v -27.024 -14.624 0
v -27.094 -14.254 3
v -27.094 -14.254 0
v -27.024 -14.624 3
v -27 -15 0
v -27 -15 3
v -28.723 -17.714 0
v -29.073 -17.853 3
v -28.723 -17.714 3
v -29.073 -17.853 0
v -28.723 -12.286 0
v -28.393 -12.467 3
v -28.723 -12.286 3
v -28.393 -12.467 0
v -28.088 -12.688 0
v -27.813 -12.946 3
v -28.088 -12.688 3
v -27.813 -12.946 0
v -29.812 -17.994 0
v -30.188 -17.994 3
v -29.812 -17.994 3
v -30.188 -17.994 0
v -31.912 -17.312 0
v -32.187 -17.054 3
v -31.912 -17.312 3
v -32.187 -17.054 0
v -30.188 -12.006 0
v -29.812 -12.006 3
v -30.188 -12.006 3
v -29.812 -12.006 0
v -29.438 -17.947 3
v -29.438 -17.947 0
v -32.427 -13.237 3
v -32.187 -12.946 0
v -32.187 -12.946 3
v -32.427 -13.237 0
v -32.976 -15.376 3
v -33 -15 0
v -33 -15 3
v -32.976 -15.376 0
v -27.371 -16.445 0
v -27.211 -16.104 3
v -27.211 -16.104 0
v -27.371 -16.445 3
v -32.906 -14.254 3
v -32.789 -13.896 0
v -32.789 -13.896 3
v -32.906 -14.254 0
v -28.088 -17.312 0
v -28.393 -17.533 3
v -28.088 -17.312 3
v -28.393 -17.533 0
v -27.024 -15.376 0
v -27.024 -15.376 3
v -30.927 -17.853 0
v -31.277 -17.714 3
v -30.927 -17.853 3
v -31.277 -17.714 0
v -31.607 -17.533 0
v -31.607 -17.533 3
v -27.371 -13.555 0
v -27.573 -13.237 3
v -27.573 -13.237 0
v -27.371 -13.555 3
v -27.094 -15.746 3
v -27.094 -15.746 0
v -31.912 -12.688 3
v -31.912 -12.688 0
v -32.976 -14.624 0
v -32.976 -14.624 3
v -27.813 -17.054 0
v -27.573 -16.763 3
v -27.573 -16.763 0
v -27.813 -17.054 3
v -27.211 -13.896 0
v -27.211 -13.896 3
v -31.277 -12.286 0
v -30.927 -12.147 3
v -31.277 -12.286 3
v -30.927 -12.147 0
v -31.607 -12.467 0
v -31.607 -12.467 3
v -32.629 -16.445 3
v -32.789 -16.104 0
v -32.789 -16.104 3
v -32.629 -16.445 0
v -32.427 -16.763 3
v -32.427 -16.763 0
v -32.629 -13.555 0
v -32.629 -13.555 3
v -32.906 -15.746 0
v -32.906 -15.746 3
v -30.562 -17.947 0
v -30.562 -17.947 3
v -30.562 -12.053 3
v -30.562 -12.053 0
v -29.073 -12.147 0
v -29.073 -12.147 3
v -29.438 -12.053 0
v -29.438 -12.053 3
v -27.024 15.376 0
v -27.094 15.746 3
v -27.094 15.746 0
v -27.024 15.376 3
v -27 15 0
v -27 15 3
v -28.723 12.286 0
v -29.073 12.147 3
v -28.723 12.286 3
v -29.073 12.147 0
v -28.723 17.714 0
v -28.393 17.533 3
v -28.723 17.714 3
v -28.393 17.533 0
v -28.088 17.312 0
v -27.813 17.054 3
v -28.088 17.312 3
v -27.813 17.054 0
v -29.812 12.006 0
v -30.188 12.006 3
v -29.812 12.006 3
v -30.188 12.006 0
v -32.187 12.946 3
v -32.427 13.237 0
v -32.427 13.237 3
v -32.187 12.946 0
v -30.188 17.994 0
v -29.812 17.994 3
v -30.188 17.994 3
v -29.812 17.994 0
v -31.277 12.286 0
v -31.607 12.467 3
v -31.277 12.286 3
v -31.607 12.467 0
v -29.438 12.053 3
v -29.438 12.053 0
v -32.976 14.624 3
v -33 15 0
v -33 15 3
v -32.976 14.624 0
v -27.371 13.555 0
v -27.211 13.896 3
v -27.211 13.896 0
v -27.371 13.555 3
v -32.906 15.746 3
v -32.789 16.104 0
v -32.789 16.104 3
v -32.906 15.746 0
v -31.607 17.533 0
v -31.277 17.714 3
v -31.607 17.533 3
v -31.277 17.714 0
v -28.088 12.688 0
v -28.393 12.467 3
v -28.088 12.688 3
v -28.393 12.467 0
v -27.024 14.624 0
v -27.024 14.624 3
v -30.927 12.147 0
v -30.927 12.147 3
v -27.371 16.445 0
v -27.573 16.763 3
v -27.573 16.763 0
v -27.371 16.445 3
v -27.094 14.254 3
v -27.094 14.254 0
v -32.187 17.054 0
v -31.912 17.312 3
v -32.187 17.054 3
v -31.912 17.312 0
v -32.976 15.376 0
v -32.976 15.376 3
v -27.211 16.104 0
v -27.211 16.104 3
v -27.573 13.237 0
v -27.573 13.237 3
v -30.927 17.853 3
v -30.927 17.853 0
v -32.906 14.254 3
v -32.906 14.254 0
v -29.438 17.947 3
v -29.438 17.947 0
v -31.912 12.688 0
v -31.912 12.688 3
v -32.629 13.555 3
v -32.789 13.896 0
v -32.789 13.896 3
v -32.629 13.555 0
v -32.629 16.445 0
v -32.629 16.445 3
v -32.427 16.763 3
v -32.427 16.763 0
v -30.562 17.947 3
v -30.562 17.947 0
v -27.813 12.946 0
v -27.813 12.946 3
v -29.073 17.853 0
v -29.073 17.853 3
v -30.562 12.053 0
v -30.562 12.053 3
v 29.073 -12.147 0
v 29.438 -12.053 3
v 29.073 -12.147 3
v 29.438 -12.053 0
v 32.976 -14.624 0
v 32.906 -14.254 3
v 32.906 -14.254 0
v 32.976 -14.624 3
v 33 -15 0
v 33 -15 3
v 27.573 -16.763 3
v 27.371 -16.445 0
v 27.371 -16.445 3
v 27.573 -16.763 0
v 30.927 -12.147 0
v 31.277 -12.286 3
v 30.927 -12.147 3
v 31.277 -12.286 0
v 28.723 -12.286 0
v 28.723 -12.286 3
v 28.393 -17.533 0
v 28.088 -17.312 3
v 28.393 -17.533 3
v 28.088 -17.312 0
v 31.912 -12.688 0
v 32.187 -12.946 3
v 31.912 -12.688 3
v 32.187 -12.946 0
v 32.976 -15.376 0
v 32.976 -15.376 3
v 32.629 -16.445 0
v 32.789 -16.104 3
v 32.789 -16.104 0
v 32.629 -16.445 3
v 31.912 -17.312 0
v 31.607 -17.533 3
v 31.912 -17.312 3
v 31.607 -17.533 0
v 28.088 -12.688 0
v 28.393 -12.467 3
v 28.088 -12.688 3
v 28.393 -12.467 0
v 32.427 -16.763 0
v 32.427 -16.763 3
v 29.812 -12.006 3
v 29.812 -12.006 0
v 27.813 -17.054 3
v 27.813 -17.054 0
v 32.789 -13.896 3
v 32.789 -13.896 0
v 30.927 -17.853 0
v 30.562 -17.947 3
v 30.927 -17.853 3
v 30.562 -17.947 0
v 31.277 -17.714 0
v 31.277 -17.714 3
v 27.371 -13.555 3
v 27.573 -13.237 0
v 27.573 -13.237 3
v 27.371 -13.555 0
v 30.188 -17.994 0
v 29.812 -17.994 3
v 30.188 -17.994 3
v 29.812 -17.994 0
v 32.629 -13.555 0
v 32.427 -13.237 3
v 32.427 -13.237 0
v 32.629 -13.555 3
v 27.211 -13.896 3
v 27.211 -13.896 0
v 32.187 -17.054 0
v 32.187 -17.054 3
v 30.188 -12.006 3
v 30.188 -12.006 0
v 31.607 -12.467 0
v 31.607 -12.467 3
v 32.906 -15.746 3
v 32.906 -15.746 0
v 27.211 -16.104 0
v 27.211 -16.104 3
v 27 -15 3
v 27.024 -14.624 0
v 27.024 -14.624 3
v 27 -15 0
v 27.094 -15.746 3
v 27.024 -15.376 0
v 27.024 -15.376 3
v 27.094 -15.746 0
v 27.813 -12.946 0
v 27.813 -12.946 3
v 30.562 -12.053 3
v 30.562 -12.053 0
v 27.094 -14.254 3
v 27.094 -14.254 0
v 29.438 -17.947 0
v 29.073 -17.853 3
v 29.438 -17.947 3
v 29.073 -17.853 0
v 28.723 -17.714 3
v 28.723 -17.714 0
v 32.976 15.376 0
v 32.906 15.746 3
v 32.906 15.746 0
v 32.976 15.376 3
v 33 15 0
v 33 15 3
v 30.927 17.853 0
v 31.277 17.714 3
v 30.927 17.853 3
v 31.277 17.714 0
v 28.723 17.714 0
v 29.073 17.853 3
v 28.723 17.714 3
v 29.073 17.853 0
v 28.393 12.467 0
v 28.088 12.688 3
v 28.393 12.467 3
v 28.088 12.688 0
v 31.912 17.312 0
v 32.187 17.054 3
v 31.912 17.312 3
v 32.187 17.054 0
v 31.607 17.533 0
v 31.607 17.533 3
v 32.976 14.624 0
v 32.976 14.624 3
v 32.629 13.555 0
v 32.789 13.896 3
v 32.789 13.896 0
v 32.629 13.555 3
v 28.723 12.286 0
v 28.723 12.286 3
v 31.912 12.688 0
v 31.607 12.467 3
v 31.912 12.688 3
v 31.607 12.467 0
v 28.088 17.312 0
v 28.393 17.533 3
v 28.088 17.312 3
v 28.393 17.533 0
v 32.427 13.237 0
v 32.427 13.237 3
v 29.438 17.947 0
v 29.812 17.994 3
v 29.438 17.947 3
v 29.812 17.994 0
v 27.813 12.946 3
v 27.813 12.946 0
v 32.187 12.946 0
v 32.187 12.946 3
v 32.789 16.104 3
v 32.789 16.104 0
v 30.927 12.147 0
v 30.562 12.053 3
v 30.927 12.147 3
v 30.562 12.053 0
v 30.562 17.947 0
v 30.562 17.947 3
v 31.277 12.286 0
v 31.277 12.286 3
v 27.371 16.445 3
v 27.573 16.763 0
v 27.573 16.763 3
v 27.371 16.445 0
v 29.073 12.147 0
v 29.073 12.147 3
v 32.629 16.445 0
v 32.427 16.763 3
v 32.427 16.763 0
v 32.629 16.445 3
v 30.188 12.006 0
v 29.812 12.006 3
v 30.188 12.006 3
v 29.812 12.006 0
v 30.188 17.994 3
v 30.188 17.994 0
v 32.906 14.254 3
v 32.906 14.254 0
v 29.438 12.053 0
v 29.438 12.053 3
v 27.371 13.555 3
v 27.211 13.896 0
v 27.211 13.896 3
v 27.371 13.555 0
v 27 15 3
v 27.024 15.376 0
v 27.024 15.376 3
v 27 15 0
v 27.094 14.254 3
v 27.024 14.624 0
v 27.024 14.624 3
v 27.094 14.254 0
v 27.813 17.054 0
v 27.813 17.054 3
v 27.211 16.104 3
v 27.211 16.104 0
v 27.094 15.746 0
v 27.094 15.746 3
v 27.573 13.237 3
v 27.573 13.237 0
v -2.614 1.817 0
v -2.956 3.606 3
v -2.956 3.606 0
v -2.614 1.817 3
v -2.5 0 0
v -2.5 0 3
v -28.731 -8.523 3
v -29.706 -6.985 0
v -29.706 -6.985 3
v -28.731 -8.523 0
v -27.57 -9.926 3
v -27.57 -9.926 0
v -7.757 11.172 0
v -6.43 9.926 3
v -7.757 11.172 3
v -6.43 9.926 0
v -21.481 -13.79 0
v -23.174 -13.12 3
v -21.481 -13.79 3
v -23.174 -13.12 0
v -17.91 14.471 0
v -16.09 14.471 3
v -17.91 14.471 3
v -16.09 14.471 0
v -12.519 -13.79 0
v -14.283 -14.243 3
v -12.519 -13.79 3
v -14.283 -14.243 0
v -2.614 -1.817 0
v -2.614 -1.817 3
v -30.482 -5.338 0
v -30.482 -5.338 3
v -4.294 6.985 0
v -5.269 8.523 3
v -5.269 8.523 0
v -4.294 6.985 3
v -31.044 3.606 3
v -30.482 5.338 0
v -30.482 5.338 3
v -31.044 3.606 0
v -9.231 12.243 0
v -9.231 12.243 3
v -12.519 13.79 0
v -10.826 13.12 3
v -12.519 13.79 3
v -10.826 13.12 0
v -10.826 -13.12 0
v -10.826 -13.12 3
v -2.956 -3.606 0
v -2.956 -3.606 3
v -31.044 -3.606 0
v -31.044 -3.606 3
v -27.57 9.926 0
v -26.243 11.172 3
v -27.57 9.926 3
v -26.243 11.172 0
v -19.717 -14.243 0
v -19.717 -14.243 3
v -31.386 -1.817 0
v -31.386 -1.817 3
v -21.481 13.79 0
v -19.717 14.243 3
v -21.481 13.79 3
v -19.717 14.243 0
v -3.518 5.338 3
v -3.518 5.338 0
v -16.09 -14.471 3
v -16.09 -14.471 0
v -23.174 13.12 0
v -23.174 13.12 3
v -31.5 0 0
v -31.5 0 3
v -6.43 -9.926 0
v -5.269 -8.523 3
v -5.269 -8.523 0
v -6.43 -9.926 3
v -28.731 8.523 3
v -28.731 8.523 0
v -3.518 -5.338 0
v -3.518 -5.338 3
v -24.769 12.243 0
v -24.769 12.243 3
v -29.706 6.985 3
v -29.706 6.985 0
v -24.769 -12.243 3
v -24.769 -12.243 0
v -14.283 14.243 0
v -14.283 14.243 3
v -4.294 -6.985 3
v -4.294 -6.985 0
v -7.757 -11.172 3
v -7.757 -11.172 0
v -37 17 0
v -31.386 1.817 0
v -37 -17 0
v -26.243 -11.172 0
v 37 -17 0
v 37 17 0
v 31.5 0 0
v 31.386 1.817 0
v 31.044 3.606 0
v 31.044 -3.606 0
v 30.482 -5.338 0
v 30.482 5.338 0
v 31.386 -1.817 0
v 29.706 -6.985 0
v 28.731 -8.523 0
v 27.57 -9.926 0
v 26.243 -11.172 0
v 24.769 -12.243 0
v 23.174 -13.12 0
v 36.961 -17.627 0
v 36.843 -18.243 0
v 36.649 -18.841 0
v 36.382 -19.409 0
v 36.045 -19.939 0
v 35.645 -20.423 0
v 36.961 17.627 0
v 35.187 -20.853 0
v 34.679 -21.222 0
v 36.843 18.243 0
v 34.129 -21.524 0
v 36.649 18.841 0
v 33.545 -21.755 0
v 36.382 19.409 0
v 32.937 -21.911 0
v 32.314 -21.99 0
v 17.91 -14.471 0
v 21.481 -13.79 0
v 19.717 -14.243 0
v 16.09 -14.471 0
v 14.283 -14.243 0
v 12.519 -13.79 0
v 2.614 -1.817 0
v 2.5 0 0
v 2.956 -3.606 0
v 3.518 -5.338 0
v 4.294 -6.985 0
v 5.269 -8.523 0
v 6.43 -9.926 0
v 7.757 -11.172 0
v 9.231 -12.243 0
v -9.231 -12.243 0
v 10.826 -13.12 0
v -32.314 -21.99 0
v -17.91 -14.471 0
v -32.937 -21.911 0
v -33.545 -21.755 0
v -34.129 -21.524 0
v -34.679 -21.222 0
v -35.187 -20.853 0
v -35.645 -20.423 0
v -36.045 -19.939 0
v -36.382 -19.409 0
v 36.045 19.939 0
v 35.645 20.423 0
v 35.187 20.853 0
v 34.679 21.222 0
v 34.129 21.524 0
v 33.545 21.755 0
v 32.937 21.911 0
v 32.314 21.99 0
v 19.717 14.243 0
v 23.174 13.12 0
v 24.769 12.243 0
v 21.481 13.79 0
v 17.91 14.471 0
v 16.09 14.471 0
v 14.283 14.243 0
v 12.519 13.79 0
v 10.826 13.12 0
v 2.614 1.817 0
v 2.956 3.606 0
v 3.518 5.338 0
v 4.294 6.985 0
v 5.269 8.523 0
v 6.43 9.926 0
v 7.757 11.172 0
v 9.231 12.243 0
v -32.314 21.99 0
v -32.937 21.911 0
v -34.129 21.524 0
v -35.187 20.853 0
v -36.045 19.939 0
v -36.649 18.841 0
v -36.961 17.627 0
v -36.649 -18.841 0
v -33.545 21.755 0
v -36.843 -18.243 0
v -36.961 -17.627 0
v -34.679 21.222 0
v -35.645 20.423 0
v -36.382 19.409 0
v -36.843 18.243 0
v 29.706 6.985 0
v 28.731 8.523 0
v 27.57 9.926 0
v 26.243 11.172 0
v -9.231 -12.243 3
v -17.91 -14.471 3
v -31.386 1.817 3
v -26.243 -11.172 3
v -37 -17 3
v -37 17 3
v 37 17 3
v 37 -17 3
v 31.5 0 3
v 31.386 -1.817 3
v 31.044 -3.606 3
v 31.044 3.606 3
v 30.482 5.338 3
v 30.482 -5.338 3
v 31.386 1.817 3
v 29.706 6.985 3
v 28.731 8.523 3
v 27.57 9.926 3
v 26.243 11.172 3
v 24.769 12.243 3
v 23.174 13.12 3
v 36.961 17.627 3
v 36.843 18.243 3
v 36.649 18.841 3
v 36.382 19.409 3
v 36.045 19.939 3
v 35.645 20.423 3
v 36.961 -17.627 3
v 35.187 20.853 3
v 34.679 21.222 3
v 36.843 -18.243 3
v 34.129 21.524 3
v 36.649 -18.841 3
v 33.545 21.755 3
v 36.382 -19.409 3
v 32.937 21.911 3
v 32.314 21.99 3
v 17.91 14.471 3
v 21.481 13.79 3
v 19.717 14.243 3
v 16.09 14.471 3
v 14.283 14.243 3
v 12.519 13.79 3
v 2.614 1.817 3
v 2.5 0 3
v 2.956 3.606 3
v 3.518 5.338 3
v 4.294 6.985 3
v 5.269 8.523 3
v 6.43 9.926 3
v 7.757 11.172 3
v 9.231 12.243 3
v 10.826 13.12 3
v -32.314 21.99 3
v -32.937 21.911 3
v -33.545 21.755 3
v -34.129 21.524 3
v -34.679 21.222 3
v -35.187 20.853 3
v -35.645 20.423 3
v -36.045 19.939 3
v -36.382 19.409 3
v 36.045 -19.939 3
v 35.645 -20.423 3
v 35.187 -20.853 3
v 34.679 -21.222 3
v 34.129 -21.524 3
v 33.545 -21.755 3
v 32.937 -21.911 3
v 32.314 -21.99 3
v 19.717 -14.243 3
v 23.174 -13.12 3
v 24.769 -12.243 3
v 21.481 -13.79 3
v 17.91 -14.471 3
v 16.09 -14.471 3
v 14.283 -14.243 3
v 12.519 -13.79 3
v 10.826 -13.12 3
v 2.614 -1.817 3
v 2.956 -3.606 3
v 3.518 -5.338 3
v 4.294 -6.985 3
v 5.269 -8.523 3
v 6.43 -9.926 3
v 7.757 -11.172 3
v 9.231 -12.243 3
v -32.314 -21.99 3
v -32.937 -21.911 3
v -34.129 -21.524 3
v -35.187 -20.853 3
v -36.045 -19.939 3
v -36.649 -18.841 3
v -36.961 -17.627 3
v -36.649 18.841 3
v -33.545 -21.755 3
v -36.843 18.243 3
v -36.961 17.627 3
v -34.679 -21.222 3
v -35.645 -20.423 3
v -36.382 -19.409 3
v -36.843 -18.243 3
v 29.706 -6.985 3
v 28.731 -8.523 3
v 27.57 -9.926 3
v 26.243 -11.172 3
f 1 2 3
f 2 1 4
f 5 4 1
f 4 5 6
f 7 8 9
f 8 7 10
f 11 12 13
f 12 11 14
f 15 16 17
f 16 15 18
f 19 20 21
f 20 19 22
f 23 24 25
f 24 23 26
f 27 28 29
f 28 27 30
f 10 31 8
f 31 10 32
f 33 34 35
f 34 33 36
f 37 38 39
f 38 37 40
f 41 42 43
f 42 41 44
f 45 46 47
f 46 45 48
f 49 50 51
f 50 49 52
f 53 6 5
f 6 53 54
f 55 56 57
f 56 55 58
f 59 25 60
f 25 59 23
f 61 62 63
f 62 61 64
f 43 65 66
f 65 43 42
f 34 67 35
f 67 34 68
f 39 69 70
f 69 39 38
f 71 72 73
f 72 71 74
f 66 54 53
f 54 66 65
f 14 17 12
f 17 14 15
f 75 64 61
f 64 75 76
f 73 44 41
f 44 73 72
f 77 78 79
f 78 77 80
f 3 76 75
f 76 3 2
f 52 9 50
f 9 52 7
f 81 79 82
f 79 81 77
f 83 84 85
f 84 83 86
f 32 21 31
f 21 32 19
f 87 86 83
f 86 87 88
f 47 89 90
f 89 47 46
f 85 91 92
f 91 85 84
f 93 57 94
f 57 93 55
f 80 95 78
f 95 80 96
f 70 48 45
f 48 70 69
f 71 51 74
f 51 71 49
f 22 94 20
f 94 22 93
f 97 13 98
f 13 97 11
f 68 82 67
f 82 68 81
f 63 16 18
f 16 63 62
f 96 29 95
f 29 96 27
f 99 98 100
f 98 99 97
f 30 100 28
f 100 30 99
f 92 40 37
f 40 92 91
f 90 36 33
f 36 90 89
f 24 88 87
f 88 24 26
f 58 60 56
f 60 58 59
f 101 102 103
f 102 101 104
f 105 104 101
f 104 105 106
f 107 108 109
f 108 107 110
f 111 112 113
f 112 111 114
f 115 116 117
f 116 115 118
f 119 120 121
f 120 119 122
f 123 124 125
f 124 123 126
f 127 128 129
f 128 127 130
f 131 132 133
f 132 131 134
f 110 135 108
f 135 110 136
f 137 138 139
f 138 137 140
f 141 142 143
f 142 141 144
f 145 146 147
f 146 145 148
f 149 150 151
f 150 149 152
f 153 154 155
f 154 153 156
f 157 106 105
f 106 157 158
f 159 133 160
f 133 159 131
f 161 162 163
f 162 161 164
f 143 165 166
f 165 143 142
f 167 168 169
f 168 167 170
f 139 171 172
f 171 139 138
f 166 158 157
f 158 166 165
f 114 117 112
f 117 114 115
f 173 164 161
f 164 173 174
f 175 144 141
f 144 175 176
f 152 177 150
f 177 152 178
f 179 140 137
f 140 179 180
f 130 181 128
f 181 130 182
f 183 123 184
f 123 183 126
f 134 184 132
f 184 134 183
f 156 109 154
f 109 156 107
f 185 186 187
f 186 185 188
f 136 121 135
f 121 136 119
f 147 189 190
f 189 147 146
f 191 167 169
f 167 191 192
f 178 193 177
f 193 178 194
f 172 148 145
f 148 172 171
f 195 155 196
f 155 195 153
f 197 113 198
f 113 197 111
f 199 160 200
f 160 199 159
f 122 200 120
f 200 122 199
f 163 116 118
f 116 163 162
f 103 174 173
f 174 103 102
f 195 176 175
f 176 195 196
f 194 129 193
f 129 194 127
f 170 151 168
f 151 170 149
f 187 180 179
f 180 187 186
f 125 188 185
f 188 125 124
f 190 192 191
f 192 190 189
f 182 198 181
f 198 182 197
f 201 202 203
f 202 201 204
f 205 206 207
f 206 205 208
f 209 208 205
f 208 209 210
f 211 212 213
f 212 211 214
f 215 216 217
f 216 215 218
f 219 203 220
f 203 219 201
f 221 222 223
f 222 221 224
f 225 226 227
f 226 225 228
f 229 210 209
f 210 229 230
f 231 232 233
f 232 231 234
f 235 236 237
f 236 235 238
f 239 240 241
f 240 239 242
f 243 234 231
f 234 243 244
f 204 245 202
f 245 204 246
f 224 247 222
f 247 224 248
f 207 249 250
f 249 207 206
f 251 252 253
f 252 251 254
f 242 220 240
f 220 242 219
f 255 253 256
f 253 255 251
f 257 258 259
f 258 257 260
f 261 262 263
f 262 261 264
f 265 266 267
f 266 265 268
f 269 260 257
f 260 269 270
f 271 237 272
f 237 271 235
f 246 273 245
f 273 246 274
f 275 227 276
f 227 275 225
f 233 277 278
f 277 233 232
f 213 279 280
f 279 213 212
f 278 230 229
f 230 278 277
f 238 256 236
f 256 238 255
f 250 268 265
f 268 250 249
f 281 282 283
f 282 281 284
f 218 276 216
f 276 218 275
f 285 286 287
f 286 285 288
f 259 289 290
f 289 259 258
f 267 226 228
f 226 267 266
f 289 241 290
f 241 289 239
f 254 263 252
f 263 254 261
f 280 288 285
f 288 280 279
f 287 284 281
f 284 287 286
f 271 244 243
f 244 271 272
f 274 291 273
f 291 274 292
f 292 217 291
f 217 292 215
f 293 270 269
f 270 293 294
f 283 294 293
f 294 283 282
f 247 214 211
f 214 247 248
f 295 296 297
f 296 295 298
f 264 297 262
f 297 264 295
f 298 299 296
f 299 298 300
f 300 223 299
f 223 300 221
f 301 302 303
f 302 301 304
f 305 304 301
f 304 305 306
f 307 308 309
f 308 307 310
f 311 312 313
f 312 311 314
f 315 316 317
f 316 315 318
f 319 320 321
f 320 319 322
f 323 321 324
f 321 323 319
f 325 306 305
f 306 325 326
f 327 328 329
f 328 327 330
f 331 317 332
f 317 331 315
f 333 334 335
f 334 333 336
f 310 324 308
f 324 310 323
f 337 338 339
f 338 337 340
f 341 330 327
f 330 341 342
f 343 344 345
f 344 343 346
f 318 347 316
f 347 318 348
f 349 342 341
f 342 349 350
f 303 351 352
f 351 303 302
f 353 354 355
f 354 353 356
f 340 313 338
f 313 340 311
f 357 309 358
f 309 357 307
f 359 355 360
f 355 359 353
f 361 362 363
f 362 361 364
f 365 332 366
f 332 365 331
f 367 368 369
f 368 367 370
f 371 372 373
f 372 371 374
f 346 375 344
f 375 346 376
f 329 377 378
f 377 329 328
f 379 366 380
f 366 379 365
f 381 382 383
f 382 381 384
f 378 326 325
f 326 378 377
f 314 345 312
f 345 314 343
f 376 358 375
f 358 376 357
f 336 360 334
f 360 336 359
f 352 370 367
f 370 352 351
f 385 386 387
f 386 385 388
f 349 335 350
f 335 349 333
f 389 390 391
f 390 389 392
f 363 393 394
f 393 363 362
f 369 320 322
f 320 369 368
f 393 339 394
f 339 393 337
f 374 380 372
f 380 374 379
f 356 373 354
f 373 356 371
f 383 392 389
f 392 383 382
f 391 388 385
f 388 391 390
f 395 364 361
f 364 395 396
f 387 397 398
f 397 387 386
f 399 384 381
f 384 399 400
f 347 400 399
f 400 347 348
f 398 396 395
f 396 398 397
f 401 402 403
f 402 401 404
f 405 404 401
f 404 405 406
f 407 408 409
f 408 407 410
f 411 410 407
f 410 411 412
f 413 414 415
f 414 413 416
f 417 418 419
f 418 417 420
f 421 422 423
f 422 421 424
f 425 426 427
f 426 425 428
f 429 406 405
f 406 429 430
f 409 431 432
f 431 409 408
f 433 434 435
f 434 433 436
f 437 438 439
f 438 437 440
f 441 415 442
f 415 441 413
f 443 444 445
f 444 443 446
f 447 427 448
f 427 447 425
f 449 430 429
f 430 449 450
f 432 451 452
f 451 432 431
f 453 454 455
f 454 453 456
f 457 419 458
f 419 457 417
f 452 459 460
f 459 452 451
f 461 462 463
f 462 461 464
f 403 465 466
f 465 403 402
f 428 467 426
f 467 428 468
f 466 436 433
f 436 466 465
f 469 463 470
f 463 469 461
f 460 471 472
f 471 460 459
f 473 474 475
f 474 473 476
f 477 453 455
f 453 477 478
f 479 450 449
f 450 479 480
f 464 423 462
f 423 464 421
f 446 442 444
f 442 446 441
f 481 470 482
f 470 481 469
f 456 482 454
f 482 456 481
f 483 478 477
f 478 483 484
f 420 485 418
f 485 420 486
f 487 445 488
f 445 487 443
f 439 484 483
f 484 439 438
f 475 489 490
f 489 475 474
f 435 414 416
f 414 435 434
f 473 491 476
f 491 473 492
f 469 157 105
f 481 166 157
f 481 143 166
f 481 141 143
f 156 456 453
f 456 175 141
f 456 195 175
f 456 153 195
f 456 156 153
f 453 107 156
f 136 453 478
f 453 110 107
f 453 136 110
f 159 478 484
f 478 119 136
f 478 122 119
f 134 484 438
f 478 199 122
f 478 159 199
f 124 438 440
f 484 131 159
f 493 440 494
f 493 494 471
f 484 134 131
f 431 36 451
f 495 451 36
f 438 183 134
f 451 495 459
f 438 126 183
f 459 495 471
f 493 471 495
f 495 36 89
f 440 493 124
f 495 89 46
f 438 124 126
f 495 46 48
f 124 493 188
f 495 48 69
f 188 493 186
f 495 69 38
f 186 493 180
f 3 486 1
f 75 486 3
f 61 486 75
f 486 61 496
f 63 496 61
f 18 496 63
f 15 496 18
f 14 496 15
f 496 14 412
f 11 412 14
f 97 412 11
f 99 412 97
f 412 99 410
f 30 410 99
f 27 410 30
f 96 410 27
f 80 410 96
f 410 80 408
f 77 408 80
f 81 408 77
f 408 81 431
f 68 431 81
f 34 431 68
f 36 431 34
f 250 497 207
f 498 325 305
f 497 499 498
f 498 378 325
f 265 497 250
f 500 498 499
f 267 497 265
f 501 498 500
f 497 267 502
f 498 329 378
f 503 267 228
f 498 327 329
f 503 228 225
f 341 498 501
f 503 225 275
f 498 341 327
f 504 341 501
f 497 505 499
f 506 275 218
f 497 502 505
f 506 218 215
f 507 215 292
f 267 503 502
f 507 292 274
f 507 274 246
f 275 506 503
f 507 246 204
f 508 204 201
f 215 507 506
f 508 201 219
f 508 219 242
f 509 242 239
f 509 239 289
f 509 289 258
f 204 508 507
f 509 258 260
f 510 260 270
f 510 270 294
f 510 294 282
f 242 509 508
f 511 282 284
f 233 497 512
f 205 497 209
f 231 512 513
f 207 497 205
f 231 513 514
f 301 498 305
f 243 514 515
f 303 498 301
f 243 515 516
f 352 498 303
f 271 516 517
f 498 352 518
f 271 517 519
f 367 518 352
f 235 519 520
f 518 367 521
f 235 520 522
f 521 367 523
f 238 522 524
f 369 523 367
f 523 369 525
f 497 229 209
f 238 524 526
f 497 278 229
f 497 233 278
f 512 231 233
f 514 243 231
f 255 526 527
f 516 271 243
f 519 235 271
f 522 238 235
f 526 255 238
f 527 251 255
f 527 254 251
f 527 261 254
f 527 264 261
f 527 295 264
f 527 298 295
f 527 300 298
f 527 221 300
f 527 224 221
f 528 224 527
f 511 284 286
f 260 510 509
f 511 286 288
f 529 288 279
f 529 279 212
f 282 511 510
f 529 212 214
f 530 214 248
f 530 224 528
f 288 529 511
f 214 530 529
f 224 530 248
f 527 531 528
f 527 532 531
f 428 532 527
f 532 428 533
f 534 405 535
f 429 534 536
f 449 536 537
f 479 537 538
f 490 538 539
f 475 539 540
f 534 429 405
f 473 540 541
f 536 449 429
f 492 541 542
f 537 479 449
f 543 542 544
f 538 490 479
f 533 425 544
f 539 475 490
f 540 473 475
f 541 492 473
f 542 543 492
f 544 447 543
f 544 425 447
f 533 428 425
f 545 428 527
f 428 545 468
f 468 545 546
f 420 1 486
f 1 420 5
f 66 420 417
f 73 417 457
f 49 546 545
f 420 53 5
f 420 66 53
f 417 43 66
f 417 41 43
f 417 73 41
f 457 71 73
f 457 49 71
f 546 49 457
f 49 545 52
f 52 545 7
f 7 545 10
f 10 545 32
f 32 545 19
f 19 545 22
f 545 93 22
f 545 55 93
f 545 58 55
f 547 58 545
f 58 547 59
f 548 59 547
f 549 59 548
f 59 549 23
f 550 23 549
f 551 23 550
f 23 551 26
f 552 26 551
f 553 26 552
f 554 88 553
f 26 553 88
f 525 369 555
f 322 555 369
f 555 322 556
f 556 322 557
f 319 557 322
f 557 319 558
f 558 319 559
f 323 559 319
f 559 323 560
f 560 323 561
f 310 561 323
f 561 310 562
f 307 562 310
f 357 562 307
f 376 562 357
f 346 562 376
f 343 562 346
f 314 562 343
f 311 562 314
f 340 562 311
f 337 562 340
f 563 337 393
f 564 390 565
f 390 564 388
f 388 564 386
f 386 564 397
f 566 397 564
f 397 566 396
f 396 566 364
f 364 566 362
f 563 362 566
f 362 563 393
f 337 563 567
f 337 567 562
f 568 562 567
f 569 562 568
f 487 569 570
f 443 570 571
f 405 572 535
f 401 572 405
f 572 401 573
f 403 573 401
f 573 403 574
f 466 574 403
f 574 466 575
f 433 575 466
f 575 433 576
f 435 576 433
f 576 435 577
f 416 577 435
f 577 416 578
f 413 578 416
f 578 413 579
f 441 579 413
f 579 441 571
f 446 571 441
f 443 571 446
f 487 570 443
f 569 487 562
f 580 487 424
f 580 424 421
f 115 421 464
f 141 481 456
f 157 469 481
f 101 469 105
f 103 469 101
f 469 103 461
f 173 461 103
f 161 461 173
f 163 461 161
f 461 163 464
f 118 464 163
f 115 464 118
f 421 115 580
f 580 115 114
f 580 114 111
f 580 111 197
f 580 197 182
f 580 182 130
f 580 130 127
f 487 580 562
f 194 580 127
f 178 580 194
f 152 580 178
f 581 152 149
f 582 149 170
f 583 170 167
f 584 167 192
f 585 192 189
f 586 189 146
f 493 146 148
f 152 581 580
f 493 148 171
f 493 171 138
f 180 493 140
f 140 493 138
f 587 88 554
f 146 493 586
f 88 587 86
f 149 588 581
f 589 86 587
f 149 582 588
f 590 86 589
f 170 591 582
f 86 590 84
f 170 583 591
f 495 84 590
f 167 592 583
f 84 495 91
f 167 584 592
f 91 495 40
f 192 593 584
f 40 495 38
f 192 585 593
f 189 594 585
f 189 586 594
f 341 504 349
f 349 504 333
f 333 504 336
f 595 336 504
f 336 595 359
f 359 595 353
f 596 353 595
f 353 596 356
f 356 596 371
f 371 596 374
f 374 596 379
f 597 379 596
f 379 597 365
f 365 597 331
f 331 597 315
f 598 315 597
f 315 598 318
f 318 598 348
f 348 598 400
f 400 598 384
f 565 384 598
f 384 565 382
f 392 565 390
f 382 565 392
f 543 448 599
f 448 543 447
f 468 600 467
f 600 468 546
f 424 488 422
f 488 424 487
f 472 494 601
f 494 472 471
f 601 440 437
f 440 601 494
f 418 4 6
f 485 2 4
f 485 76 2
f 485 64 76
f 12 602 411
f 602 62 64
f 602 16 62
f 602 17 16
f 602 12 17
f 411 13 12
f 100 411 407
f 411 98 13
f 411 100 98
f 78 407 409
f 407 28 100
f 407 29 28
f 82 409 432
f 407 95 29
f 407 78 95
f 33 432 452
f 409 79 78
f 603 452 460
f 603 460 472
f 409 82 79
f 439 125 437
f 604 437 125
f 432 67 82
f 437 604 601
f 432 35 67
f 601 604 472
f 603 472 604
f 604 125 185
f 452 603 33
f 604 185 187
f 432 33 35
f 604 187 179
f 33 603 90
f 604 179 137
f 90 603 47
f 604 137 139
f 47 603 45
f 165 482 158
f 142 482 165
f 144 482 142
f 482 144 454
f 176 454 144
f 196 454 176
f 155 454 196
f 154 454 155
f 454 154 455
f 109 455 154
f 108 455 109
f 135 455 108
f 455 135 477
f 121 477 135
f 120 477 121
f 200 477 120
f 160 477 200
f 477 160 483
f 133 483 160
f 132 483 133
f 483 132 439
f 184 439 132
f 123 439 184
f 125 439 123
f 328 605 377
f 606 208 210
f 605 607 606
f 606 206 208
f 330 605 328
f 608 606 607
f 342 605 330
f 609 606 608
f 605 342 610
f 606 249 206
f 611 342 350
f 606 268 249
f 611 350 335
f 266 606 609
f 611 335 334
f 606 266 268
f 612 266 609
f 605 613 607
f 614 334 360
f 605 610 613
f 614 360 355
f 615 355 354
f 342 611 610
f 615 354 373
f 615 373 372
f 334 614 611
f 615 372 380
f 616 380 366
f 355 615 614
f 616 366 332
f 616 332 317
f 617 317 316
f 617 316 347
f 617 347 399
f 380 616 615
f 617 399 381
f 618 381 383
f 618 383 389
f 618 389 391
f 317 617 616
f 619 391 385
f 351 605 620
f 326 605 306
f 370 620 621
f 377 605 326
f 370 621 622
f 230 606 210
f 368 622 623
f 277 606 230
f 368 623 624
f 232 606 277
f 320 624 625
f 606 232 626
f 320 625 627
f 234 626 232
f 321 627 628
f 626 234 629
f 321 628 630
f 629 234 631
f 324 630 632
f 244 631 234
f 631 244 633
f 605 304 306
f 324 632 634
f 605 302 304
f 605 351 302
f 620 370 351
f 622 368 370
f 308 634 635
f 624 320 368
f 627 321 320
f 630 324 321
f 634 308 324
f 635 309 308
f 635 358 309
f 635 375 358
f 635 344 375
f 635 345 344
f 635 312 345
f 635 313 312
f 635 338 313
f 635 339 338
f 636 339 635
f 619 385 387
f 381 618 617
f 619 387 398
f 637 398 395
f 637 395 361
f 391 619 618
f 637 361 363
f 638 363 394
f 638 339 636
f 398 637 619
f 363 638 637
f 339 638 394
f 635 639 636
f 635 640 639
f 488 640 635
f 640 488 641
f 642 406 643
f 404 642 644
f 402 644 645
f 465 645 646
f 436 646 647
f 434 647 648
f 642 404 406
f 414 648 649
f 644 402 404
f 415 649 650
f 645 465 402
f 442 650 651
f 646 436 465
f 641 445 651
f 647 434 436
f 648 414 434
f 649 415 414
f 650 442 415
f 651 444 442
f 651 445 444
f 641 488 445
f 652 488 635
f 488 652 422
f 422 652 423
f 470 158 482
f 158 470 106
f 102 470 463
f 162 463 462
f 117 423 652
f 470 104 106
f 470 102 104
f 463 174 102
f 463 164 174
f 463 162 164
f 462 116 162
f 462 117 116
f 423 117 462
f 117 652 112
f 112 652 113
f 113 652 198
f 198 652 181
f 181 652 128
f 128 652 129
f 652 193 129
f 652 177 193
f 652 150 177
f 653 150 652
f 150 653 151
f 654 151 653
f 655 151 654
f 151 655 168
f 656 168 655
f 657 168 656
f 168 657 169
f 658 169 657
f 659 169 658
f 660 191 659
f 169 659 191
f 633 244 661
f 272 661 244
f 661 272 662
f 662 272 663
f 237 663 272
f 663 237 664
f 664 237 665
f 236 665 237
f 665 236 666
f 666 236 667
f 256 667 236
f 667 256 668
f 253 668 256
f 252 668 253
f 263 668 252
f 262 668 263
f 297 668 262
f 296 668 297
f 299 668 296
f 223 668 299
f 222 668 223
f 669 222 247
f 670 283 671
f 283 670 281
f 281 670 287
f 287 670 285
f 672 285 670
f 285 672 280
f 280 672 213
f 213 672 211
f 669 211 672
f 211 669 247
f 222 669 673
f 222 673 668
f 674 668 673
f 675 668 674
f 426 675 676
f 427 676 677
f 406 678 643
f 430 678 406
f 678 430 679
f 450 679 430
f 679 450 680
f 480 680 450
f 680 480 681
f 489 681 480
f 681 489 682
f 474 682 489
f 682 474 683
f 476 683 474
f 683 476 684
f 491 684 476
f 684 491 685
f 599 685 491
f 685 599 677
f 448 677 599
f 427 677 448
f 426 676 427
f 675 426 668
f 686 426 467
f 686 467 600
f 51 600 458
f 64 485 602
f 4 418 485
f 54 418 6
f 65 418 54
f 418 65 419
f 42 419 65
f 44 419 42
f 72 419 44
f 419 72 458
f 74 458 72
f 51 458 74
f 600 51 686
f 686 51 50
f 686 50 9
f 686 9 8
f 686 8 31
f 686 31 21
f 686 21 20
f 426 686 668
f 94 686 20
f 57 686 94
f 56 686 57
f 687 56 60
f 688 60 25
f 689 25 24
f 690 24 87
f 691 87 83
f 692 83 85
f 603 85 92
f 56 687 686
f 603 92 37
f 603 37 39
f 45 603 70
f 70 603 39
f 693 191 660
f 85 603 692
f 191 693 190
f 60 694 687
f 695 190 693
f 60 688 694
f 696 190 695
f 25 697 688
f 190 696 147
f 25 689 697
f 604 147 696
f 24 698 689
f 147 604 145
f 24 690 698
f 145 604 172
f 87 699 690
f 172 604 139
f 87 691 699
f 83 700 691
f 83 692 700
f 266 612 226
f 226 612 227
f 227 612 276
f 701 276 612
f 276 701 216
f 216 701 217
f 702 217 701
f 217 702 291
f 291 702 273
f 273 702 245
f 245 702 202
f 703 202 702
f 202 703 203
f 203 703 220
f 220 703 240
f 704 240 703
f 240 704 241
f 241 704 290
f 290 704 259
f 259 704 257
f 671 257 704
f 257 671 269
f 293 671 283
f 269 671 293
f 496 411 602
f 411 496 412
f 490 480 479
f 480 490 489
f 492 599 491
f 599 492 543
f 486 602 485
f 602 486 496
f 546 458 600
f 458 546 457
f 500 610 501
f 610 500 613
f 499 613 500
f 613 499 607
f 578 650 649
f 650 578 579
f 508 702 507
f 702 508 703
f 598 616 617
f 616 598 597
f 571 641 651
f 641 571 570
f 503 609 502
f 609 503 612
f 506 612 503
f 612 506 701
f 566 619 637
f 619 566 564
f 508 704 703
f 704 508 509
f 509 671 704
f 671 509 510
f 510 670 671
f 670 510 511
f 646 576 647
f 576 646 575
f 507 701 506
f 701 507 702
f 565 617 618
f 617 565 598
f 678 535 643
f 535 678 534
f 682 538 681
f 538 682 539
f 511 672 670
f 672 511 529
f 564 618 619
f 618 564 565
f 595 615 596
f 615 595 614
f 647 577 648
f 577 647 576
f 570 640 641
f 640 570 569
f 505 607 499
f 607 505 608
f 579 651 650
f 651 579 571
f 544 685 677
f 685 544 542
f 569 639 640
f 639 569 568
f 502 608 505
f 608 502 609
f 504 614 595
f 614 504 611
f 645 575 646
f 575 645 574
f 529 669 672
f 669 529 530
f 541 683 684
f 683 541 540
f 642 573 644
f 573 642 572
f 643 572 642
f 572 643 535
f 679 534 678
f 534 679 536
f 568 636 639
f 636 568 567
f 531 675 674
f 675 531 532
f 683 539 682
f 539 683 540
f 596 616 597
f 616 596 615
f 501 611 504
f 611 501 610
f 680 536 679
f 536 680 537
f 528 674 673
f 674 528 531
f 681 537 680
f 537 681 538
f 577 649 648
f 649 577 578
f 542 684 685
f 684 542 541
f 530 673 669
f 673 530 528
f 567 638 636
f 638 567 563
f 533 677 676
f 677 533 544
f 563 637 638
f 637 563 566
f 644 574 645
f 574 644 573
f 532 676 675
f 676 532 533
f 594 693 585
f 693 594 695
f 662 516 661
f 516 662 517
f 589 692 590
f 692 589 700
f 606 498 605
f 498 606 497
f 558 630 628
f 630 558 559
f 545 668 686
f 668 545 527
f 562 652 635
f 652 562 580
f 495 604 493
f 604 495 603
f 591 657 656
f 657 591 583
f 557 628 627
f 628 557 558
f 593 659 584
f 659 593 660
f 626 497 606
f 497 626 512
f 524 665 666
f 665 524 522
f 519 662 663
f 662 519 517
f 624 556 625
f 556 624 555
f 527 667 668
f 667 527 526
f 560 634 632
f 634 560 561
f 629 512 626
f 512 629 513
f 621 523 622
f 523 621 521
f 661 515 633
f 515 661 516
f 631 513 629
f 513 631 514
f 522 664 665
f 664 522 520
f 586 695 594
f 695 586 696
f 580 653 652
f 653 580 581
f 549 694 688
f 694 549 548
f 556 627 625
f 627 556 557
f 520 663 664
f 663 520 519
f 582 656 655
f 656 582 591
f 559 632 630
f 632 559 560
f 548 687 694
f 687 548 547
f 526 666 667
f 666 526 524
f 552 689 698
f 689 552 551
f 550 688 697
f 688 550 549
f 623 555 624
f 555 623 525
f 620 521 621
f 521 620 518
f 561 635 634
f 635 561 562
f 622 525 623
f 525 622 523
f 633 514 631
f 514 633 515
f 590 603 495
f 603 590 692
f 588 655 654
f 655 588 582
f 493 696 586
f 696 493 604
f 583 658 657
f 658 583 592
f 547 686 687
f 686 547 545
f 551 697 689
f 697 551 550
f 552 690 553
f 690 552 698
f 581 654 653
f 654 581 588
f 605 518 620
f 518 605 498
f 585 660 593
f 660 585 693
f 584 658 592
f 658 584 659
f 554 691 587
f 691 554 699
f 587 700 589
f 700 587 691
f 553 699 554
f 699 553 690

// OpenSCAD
$fn = 50;


difference() {
	union() {
		hull() {
			translate(v = [-32.0000000000, 17.0000000000, 0]) {
				cylinder(h = 3, r = 5);
			}
			translate(v = [32.0000000000, 17.0000000000, 0]) {
				cylinder(h = 3, r = 5);
			}
			translate(v = [-32.0000000000, -17.0000000000, 0]) {
				cylinder(h = 3, r = 5);
			}
			translate(v = [32.0000000000, -17.0000000000, 0]) {
				cylinder(h = 3, r = 5);
			}
		}
	}
	union() {
		#translate(v = [-30.0000000000, -15.0000000000, -100.0000000000]) {
			cylinder(h = 200, r = 3.0000000000);
		}
		#translate(v = [-30.0000000000, 15.0000000000, -100.0000000000]) {
			cylinder(h = 200, r = 3.0000000000);
		}
		#translate(v = [30.0000000000, -15.0000000000, -100.0000000000]) {
			cylinder(h = 200, r = 3.0000000000);
		}
		#translate(v = [30.0000000000, 15.0000000000, -100.0000000000]) {
			cylinder(h = 200, r = 3.0000000000);
		}
		#translate(v = [-17.0000000000, 0, 0]) {
			cylinder(h = 3, r = 14.5000000000);
		}
		#translate(v = [17.0000000000, 0, 0]) {
			cylinder(h = 3, r = 14.5000000000);
		}
	}
}
